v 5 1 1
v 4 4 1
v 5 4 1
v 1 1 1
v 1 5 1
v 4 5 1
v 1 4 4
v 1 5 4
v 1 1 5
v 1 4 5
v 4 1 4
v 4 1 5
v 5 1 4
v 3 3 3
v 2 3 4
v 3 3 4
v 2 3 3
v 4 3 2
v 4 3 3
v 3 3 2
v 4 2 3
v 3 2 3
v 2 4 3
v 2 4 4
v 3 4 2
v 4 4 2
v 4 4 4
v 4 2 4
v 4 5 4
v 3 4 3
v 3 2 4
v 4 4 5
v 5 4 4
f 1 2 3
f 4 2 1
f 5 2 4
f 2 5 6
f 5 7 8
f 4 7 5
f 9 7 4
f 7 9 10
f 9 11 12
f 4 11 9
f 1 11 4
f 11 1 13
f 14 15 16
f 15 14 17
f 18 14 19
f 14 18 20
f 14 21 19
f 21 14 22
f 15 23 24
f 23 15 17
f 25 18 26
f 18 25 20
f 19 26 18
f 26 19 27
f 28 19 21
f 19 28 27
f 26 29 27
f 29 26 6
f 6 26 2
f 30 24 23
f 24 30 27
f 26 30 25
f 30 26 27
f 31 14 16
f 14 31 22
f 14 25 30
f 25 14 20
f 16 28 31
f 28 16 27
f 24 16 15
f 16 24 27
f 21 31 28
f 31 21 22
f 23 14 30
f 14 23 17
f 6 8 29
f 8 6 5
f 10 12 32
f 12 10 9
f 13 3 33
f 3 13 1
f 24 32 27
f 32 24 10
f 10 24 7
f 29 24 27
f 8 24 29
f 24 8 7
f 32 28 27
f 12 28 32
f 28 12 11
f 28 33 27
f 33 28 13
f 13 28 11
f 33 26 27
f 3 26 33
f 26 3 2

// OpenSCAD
union() {
    translate([1, 1, 1]) cube([1, 1, 1]);
    translate([1, 1, 2]) cube([1, 1, 1]);
    translate([1, 2, 1]) cube([1, 1, 1]);
    translate([1, 2, 2]) cube([1, 1, 1]);
    translate([2, 1, 1]) cube([1, 1, 1]);
    translate([2, 1, 2]) cube([1, 1, 1]);
    translate([2, 2, 1]) cube([1, 1, 1]);
    translate([2, 2, 2]) cube([1, 1, 1]);
    translate([1, 1, 3]) cube([1, 1, 1]);
    translate([1, 3, 1]) cube([1, 1, 1]);
    translate([3, 1, 1]) cube([1, 1, 1]);
    translate([1, 2, 3]) cube([1, 1, 1]);
    translate([1, 3, 2]) cube([1, 1, 1]);
    translate([2, 1, 3]) cube([1, 1, 1]);
    translate([2, 3, 1]) cube([1, 1, 1]);
    translate([3, 1, 2]) cube([1, 1, 1]);
    translate([3, 2, 1]) cube([1, 1, 1]);
    translate([1, 3, 3]) cube([1, 1, 1]);
    translate([3, 1, 3]) cube([1, 1, 1]);
    translate([3, 3, 1]) cube([1, 1, 1]);
    translate([2, 2, 3]) cube([1, 1, 1]);
    translate([2, 3, 2]) cube([1, 1, 1]);
    translate([3, 2, 2]) cube([1, 1, 1]);
    translate([1, 4, 1]) cube([1, 1, 1]);
    translate([1, 1, 4]) cube([1, 1, 1]);
    translate([4, 1, 1]) cube([1, 1, 1]);
    translate([1, 2, 4]) cube([1, 1, 1]);
    translate([1, 4, 2]) cube([1, 1, 1]);
    translate([2, 1, 4]) cube([1, 1, 1]);
    translate([2, 4, 1]) cube([1, 1, 1]);
    translate([4, 1, 2]) cube([1, 1, 1]);
    translate([4, 2, 1]) cube([1, 1, 1]);
    translate([1, 3, 4]) cube([1, 1, 1]);
    translate([1, 4, 3]) cube([1, 1, 1]);
    translate([3, 1, 4]) cube([1, 1, 1]);
    translate([3, 4, 1]) cube([1, 1, 1]);
    translate([4, 1, 3]) cube([1, 1, 1]);
    translate([4, 3, 1]) cube([1, 1, 1]);
    translate([2, 3, 4]) cube([1, 1, 1]);
    translate([2, 4, 3]) cube([1, 1, 1]);
    translate([3, 2, 4]) cube([1, 1, 1]);
    translate([3, 4, 2]) cube([1, 1, 1]);
    translate([4, 2, 3]) cube([1, 1, 1]);
    translate([4, 3, 2]) cube([1, 1, 1]);
    translate([2, 2, 4]) cube([1, 1, 1]);
    translate([2, 4, 2]) cube([1, 1, 1]);
    translate([4, 2, 2]) cube([1, 1, 1]);
    translate([3, 3, 4]) cube([1, 1, 1]);
    translate([3, 4, 3]) cube([1, 1, 1]);
    translate([4, 3, 3]) cube([1, 1, 1]);
}
